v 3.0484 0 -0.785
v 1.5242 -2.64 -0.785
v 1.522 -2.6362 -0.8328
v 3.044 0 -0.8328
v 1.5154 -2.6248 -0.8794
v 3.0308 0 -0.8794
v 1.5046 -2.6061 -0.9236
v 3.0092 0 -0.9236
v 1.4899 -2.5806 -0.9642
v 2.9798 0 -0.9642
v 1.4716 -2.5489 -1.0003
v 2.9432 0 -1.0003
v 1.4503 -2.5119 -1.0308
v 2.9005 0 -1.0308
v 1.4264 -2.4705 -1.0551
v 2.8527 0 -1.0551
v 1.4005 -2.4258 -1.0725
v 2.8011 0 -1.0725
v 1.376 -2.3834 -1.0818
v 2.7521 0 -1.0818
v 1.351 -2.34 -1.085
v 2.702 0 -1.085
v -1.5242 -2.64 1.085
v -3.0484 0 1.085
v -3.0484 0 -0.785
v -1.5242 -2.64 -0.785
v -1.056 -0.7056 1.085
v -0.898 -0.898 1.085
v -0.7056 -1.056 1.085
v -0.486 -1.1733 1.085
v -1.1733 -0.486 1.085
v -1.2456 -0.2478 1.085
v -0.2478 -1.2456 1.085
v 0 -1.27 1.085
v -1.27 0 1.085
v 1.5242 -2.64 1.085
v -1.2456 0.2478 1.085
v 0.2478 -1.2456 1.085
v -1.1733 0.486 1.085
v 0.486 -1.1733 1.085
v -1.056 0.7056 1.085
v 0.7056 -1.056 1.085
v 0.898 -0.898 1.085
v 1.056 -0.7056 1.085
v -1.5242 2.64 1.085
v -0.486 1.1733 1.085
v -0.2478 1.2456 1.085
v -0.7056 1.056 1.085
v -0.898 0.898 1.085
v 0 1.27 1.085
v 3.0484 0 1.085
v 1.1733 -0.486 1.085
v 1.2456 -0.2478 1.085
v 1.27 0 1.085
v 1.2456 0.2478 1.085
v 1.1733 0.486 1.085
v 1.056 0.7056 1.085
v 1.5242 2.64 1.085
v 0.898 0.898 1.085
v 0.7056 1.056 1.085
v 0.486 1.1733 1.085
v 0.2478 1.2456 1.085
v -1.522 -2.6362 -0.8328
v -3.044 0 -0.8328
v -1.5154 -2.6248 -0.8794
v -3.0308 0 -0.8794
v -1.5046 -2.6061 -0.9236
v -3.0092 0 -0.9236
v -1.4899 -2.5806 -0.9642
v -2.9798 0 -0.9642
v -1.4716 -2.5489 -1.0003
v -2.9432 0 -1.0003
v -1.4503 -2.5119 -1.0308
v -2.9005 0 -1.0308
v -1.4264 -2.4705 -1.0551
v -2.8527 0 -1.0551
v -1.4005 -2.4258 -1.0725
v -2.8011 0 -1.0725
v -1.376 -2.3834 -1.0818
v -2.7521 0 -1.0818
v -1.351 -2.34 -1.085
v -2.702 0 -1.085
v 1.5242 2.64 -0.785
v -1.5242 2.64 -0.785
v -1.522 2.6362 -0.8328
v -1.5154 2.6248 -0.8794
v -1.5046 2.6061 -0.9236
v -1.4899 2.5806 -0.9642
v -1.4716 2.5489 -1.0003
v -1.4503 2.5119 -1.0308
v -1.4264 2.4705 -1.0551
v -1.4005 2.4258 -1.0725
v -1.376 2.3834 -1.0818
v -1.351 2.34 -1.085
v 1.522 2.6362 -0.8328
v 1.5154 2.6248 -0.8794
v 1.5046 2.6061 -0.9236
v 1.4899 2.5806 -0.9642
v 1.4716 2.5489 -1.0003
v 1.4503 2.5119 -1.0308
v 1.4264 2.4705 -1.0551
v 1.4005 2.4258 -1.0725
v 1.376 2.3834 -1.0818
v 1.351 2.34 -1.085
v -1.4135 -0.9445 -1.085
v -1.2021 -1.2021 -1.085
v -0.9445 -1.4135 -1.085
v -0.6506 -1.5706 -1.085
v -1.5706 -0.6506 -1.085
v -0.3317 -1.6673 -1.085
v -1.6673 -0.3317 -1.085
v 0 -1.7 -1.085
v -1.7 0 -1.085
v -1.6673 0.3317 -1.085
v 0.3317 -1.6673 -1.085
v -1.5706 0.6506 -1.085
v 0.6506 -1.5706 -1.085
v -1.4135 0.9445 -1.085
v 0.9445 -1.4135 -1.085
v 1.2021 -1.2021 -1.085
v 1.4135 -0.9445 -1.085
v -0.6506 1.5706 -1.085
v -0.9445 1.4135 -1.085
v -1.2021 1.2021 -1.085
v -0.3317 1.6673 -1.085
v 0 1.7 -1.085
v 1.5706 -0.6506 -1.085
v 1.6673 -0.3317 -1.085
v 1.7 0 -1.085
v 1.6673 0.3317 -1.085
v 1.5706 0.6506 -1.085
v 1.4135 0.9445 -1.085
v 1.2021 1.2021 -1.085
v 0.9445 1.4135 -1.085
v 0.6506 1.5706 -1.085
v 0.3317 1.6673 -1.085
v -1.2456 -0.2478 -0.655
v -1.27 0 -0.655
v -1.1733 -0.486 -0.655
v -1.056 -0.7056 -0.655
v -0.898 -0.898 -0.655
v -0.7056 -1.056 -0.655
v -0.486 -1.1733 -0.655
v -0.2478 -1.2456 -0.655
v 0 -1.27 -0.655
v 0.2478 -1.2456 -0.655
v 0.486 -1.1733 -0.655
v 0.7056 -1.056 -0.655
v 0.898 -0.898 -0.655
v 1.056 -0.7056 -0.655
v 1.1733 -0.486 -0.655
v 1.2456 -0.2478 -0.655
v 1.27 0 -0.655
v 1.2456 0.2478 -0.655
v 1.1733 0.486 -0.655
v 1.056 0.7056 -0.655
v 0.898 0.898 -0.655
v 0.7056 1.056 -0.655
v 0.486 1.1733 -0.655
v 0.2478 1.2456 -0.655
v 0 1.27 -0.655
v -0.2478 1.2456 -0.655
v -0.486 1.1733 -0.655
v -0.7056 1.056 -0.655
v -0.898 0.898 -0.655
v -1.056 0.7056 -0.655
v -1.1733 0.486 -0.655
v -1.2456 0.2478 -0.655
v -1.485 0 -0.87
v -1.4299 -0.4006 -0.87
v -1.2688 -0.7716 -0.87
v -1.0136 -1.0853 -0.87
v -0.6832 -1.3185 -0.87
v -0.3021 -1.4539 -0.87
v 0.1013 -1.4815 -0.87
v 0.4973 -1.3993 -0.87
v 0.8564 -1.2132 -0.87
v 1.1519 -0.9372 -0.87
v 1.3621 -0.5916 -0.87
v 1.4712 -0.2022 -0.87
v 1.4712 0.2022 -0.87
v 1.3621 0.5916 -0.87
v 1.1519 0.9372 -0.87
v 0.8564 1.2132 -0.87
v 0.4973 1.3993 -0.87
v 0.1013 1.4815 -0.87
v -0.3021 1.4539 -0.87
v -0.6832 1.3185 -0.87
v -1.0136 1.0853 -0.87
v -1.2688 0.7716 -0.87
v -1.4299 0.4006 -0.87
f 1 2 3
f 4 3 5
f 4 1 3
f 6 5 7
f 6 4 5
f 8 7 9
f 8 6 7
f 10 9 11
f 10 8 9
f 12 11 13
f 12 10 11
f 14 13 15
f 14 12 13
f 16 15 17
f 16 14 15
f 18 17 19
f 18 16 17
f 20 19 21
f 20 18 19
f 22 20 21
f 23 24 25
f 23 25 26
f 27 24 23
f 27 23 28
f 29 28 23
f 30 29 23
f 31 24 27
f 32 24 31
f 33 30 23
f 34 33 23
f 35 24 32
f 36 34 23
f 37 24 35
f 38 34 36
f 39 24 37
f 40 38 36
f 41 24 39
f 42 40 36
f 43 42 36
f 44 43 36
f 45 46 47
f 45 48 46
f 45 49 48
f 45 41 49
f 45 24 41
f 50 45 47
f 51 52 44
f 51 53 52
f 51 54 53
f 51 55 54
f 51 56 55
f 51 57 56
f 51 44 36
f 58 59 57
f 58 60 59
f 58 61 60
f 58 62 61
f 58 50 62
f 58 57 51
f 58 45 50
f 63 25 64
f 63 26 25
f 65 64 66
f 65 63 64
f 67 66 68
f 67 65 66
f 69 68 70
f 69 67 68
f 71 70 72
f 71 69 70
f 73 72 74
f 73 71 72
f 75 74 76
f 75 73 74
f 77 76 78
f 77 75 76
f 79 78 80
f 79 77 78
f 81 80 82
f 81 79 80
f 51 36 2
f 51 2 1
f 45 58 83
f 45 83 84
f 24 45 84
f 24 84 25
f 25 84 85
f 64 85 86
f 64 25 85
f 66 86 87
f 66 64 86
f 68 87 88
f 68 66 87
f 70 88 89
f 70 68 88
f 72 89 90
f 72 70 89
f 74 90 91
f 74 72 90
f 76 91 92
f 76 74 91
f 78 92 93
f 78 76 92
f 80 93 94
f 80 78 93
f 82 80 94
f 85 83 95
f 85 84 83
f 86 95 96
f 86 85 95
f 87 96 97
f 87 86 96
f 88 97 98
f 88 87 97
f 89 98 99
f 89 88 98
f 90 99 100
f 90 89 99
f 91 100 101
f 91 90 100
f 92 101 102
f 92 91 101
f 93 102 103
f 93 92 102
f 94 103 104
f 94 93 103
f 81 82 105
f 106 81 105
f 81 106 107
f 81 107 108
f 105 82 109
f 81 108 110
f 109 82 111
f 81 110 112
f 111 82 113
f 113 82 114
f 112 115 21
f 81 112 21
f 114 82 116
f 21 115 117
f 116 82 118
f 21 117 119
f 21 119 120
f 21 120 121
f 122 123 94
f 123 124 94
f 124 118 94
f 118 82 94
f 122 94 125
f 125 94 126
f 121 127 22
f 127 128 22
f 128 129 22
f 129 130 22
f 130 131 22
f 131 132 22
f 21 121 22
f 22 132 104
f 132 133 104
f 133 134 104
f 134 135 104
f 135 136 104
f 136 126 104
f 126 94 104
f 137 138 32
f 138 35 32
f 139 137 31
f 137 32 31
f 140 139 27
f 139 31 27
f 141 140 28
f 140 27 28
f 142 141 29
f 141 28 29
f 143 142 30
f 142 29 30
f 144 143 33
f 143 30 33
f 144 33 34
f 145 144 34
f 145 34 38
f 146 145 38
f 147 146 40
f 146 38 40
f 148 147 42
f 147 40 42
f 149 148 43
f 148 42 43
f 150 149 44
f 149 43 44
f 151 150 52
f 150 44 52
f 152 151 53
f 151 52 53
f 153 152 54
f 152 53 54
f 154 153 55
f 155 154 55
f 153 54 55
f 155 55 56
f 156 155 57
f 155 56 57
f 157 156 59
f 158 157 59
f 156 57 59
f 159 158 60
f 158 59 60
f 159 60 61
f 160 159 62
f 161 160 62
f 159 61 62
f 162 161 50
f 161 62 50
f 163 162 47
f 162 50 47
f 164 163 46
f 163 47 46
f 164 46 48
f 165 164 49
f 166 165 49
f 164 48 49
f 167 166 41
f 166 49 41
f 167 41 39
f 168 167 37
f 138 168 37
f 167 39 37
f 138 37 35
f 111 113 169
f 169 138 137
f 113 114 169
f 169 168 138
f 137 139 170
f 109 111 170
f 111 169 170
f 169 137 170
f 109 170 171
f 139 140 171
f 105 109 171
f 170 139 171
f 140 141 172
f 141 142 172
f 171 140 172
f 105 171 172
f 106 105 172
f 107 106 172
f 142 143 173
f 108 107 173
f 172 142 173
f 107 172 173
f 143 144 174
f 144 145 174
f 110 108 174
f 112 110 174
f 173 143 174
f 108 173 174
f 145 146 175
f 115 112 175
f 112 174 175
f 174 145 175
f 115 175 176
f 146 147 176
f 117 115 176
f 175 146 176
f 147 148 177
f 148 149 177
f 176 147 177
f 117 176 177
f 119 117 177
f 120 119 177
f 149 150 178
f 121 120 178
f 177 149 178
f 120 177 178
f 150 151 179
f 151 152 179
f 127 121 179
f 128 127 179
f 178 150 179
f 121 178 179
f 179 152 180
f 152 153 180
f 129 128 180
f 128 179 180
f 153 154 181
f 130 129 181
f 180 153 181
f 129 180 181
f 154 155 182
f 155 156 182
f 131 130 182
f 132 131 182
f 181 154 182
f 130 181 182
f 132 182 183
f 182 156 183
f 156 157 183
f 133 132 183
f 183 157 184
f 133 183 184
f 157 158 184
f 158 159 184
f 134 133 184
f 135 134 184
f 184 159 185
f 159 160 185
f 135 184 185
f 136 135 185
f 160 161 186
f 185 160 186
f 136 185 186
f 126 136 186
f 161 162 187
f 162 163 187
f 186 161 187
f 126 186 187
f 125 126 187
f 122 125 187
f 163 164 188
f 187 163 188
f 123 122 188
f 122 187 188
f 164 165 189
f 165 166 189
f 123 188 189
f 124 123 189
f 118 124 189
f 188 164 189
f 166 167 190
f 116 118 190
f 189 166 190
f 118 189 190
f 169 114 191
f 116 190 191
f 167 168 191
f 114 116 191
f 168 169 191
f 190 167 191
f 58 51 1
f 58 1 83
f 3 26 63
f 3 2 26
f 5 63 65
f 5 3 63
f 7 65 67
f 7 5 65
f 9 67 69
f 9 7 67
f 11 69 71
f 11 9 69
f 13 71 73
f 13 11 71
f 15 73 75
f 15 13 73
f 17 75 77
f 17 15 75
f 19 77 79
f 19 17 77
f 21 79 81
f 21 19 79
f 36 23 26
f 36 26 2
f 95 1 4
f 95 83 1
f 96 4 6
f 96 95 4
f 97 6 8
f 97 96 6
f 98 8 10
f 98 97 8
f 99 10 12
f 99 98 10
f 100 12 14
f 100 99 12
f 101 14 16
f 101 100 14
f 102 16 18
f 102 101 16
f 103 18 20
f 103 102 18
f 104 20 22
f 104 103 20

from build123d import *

# Parameters (mm, degrees)
F1_DEPTH       = 1.085
F3_D           = 2.54
F3_CSINK_D     = 3.4
F3_CSINK_ANGLE = 90
F4_R           = 0.3


with BuildPart() as f1:
    # F0 (on Top) → F1 (new body, symmetric)
    with BuildSketch(Plane.XY):
        Polygon((1.524205, -2.64), (3.048409, 0), (1.524205, 2.64), (-1.524205, 2.64), (-3.048409, 0), (-1.524205, -2.64), align=None)
    extrude(amount=F1_DEPTH, both=True)

    # F3 (through all)
    with Locations(Plane(origin=(0, 0, -1.085), x_dir=(1, 0, 0), z_dir=(0, 0, -1))):
        with Locations((0, 0)):
            CounterSinkHole(F3_D / 2, F3_CSINK_D / 2, counter_sink_angle=F3_CSINK_ANGLE)

    # F4
    f4_edges = [f1.edges().sort_by_distance(p)[0] for p in [
        (2.286307, 1.32, -1.085),
        (2.286307, -1.32, -1.085),
        (0, -2.64, -1.085),
        (-2.286307, -1.32, -1.085),
        (-2.286307, 1.32, -1.085),
        (0, 2.64, -1.085),
    ]]
    fillet(f4_edges, radius=F4_R)


solid = f1.part
